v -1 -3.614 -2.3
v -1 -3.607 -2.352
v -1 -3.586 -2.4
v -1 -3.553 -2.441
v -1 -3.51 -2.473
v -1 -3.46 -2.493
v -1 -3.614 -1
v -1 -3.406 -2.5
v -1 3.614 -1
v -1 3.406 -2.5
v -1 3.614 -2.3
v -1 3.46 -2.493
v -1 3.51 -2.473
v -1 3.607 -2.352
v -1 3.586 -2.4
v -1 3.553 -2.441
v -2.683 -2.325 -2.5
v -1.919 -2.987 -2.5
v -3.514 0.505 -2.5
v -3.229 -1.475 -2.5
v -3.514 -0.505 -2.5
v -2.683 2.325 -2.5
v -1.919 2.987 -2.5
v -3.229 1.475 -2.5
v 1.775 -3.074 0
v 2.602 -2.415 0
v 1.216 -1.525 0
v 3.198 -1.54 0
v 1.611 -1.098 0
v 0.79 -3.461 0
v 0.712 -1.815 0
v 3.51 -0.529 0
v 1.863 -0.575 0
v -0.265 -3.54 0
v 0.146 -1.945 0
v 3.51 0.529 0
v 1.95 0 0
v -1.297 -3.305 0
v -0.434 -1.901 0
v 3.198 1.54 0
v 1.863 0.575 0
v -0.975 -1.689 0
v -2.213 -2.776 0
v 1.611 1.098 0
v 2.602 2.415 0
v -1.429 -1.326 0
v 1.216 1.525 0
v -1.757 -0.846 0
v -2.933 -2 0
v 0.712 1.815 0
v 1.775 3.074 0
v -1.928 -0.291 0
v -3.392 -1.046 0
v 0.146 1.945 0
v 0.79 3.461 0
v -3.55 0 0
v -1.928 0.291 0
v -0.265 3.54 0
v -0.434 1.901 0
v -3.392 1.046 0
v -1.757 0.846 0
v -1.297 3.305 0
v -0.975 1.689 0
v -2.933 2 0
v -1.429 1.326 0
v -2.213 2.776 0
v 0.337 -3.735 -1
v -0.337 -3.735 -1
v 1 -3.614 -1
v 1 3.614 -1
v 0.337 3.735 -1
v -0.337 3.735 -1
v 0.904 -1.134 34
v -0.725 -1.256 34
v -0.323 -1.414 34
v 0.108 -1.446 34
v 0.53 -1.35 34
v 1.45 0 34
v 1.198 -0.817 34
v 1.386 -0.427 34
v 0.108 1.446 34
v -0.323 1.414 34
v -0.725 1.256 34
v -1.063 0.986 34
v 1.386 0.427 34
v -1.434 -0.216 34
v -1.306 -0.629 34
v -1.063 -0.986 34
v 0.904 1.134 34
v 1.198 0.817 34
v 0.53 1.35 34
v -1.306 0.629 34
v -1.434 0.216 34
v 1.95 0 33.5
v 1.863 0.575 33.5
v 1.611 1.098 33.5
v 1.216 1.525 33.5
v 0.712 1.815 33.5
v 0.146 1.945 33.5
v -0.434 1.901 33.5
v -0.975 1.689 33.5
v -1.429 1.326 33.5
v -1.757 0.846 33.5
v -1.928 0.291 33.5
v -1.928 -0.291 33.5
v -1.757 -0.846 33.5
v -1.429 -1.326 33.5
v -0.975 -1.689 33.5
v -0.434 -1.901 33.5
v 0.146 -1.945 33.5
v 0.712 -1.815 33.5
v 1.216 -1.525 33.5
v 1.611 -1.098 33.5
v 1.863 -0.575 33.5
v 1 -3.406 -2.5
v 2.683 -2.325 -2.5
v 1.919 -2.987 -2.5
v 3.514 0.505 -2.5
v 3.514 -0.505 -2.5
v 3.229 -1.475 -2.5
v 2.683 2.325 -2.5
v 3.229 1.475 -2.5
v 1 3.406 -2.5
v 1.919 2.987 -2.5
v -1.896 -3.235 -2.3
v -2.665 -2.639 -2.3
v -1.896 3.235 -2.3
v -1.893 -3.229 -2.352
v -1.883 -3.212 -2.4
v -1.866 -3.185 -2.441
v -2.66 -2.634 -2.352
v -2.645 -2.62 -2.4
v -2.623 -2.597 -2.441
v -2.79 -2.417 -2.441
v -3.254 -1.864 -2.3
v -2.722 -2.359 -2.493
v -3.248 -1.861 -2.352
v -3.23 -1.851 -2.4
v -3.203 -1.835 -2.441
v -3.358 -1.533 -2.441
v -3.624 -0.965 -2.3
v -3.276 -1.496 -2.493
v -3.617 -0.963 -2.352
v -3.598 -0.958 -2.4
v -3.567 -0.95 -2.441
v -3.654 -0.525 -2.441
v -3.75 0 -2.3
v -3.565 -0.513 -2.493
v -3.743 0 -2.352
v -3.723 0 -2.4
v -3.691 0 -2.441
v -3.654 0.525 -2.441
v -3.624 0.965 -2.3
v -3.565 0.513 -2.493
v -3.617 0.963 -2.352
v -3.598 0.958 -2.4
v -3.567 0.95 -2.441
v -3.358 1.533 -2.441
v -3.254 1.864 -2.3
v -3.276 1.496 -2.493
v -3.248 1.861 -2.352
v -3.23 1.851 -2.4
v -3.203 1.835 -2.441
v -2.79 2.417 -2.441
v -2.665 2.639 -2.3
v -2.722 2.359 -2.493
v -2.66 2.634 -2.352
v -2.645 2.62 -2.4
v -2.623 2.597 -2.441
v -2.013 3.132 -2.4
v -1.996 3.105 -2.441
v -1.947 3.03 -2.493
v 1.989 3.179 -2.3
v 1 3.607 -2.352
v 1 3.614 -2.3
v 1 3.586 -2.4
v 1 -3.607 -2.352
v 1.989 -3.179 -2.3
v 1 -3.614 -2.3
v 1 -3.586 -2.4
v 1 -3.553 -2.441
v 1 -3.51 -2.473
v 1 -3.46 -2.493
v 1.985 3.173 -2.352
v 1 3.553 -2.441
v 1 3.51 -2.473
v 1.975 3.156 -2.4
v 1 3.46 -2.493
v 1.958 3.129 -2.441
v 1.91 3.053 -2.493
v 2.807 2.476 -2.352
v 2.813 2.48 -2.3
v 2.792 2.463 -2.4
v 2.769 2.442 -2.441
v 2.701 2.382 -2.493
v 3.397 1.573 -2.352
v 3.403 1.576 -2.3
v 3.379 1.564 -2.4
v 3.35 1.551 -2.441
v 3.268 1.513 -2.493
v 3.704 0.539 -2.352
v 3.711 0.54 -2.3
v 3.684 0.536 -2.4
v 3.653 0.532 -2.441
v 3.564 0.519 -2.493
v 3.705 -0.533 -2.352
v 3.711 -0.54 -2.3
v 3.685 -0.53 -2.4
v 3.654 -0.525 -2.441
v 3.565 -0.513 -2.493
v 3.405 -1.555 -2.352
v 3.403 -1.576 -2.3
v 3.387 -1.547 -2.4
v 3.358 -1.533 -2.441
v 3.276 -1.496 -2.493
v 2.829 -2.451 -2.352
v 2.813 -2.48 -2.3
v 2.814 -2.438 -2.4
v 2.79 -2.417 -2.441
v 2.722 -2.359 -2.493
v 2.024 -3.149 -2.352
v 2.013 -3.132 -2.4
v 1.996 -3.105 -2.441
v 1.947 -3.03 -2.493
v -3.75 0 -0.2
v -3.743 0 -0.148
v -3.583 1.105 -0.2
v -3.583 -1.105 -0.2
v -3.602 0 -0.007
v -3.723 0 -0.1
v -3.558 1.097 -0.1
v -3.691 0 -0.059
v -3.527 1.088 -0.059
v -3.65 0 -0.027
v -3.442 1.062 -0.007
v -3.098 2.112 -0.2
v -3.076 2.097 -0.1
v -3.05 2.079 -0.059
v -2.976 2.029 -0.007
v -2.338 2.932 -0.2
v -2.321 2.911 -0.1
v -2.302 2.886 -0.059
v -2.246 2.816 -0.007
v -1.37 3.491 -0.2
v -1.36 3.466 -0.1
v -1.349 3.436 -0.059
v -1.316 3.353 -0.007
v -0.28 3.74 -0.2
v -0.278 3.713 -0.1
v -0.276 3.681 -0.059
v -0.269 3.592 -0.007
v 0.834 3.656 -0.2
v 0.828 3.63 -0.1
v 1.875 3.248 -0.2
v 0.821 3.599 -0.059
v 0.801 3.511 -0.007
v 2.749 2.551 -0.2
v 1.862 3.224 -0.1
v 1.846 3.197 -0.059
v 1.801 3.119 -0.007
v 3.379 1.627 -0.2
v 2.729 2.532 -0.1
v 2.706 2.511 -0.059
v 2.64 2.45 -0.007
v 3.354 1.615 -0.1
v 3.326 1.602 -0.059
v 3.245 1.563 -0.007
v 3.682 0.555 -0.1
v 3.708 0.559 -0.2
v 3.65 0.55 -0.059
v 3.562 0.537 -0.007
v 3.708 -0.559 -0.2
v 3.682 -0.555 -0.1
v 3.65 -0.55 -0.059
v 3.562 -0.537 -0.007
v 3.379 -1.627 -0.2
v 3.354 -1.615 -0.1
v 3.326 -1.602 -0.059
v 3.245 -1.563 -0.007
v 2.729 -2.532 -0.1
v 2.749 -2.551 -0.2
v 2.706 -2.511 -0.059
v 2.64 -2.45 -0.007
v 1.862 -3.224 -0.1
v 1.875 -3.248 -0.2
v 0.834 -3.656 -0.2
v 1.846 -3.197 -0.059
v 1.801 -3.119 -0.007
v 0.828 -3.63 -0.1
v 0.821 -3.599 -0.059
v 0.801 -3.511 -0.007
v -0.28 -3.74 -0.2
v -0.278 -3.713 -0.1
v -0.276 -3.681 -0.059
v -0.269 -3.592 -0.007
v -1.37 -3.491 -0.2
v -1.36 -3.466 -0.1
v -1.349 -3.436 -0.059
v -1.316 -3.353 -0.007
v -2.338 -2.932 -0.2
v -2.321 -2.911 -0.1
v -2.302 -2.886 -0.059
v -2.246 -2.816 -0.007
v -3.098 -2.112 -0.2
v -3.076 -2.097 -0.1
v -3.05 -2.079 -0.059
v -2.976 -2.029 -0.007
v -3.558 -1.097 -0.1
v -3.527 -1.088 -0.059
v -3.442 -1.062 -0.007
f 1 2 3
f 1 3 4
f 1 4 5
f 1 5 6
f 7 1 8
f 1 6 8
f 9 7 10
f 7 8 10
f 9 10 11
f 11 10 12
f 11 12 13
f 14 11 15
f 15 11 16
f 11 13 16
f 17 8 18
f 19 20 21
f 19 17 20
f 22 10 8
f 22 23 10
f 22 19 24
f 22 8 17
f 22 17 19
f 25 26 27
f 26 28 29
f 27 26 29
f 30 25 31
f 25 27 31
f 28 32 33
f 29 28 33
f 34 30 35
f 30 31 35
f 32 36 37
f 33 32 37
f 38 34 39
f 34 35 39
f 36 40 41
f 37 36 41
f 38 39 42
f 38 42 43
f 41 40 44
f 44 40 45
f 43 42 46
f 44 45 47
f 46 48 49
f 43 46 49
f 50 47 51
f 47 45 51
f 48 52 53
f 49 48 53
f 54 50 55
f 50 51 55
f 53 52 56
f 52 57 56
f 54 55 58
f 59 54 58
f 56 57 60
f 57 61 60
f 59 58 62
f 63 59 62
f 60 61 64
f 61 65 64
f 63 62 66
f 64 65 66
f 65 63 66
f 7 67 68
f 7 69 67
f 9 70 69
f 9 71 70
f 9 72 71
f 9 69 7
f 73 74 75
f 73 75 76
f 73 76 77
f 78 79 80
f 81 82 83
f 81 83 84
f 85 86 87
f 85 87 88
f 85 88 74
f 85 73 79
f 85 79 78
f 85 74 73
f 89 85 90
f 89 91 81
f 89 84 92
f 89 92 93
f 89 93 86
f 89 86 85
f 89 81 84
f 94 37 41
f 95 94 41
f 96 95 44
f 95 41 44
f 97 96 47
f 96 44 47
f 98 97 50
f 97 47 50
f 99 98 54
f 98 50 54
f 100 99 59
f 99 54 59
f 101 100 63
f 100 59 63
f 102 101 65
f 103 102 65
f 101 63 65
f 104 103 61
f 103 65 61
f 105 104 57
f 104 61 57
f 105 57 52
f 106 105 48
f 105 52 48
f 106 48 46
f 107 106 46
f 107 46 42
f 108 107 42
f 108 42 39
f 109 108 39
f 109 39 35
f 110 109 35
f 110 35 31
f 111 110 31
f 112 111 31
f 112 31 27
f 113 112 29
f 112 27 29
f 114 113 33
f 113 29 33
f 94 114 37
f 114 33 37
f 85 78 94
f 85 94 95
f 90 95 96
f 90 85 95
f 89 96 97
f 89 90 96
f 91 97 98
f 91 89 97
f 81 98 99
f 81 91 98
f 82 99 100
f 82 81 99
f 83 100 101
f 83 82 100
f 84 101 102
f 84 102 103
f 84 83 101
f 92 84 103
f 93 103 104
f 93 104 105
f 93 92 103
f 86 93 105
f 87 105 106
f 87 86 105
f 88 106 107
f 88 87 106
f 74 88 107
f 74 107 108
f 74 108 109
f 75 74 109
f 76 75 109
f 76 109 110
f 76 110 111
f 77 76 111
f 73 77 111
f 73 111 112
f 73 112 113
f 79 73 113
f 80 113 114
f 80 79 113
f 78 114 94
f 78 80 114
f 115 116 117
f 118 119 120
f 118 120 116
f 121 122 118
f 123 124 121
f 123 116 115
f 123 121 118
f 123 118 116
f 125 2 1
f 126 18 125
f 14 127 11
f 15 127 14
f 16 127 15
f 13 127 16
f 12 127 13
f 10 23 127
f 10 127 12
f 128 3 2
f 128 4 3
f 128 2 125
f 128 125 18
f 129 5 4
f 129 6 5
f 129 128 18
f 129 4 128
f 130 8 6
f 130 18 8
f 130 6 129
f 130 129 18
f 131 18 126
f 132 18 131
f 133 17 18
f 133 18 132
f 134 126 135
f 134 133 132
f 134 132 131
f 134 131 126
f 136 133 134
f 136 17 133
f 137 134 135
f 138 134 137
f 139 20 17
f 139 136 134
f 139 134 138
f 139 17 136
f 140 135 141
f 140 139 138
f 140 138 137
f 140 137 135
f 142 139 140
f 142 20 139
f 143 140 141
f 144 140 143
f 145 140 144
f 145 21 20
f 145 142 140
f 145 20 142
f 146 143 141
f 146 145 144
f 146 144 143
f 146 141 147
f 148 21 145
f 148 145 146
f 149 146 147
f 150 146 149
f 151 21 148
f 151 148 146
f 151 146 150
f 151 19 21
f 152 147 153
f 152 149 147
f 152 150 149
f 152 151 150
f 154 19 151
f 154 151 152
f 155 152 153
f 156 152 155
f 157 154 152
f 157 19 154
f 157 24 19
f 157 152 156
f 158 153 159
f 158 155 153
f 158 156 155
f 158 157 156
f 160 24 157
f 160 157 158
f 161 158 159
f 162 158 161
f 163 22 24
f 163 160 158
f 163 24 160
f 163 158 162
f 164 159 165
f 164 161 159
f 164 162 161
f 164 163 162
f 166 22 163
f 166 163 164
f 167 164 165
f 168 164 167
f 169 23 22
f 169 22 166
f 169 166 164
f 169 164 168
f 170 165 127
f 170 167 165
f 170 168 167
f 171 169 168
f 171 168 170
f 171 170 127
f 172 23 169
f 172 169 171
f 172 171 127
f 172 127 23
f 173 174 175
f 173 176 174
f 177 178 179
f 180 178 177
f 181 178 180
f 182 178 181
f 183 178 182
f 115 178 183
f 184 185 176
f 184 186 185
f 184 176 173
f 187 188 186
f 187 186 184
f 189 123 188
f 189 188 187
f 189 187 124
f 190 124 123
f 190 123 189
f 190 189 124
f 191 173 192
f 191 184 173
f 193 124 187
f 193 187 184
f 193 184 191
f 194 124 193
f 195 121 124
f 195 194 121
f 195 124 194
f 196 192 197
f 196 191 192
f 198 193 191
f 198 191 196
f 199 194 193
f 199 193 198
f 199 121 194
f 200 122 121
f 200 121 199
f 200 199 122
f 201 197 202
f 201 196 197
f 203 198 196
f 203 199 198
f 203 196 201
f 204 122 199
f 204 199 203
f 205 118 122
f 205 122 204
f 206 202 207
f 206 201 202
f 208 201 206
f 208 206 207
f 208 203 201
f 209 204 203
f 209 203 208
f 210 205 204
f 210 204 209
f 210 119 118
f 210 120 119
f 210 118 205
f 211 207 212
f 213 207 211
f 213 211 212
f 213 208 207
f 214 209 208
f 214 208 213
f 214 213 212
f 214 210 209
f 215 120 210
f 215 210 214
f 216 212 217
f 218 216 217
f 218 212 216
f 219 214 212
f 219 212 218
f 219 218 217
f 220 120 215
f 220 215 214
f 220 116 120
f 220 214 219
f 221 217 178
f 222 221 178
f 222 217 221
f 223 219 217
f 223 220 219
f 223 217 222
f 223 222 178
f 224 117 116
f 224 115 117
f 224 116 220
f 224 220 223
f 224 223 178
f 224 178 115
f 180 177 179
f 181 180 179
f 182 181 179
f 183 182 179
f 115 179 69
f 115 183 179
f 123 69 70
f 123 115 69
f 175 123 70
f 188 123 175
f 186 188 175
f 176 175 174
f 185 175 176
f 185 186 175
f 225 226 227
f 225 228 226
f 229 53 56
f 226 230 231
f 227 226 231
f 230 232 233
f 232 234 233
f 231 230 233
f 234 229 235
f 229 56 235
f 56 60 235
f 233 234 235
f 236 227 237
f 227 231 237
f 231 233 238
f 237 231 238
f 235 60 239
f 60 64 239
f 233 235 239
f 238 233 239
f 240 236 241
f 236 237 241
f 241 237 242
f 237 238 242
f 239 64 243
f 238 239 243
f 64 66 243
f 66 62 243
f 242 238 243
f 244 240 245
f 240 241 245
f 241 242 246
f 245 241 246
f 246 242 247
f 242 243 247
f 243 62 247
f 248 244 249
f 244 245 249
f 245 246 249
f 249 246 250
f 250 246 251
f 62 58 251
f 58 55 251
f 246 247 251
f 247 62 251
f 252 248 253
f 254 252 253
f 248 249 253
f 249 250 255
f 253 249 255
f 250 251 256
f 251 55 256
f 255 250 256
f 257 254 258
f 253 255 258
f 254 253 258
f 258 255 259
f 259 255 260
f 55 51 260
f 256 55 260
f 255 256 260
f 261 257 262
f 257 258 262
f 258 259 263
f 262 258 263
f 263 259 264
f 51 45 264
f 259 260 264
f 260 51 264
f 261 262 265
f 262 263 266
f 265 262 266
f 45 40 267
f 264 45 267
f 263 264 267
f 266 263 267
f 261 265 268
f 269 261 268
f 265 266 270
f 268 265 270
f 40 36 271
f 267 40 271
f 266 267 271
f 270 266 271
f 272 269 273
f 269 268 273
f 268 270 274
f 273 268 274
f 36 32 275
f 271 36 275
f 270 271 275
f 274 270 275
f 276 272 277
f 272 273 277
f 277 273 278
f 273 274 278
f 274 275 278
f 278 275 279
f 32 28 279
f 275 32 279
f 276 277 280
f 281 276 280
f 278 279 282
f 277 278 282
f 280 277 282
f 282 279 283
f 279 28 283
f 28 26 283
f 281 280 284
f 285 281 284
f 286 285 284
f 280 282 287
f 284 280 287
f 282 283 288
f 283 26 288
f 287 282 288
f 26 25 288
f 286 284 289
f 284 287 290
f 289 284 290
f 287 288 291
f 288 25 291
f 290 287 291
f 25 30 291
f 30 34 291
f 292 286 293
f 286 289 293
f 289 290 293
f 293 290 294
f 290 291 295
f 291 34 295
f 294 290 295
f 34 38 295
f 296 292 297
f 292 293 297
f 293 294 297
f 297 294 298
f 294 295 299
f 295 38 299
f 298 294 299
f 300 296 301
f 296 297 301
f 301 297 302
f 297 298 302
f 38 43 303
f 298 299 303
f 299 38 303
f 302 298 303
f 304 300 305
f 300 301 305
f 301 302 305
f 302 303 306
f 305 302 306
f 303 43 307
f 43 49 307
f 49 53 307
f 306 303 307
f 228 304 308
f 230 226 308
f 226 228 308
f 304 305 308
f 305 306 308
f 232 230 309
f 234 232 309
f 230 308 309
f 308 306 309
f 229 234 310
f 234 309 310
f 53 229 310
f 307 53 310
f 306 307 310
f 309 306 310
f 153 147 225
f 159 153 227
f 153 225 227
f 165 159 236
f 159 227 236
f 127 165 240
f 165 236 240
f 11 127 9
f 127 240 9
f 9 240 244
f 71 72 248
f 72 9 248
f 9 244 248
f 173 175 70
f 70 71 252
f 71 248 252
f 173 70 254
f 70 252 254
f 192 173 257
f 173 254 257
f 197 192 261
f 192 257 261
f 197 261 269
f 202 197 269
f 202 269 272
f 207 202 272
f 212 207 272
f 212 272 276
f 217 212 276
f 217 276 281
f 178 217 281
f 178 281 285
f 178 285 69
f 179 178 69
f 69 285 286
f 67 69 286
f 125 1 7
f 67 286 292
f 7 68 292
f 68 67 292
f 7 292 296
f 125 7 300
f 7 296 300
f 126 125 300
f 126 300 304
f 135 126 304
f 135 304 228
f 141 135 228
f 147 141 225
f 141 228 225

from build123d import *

# Parameters (mm, degrees)
SKETCH2_R           = 1.95
BOSS_EXTRUDE1_DEPTH = 34
SKETCH3_R           = 3.75
BOSS_EXTRUDE2_DEPTH = 2.5
SKETCH4_W           = 2
SKETCH4_H           = 10
CUT_EXTRUDE1_DEPTH  = 1.5
FILLET1_R           = 0.2
CHAMFER1_SIZE       = 0.5


with BuildPart() as part:
    # Sketch2 → Boss-Extrude1 (new body)
    with BuildSketch(Plane.XY):
        Circle(SKETCH2_R)
    extrude(amount=BOSS_EXTRUDE1_DEPTH)

    # Sketch3 → Boss-Extrude2 (add)
    with BuildSketch(Plane(origin=(0, 0, 0), x_dir=(-1, 0, 0), z_dir=(0, 0, -1))):
        Circle(SKETCH3_R)
    extrude(amount=BOSS_EXTRUDE2_DEPTH)

    # Sketch4 → Cut-Extrude1 (cut)
    with BuildSketch(Plane(origin=(0, 0, -2.5), x_dir=(-1, 0, 0), z_dir=(0, 0, -1))):
        Rectangle(SKETCH4_W, SKETCH4_H)
    extrude(amount=-CUT_EXTRUDE1_DEPTH, mode=Mode.SUBTRACT)

    # Fillet1
    fillet1_edges = [part.edges().sort_by_distance(p)[0] for p in [
        (-2.984334097, 2.270737766, -2.5),
        (3.75, 0, 0),
        (3.75, 0, -2.5),
    ]]
    fillet(fillet1_edges, radius=FILLET1_R)

    # Chamfer1
    chamfer1_edges = [part.edges().sort_by_distance(p)[0] for p in [
        (-1.95, 0, 34),
    ]]
    chamfer(chamfer1_edges, length=CHAMFER1_SIZE)


solid = part.part
